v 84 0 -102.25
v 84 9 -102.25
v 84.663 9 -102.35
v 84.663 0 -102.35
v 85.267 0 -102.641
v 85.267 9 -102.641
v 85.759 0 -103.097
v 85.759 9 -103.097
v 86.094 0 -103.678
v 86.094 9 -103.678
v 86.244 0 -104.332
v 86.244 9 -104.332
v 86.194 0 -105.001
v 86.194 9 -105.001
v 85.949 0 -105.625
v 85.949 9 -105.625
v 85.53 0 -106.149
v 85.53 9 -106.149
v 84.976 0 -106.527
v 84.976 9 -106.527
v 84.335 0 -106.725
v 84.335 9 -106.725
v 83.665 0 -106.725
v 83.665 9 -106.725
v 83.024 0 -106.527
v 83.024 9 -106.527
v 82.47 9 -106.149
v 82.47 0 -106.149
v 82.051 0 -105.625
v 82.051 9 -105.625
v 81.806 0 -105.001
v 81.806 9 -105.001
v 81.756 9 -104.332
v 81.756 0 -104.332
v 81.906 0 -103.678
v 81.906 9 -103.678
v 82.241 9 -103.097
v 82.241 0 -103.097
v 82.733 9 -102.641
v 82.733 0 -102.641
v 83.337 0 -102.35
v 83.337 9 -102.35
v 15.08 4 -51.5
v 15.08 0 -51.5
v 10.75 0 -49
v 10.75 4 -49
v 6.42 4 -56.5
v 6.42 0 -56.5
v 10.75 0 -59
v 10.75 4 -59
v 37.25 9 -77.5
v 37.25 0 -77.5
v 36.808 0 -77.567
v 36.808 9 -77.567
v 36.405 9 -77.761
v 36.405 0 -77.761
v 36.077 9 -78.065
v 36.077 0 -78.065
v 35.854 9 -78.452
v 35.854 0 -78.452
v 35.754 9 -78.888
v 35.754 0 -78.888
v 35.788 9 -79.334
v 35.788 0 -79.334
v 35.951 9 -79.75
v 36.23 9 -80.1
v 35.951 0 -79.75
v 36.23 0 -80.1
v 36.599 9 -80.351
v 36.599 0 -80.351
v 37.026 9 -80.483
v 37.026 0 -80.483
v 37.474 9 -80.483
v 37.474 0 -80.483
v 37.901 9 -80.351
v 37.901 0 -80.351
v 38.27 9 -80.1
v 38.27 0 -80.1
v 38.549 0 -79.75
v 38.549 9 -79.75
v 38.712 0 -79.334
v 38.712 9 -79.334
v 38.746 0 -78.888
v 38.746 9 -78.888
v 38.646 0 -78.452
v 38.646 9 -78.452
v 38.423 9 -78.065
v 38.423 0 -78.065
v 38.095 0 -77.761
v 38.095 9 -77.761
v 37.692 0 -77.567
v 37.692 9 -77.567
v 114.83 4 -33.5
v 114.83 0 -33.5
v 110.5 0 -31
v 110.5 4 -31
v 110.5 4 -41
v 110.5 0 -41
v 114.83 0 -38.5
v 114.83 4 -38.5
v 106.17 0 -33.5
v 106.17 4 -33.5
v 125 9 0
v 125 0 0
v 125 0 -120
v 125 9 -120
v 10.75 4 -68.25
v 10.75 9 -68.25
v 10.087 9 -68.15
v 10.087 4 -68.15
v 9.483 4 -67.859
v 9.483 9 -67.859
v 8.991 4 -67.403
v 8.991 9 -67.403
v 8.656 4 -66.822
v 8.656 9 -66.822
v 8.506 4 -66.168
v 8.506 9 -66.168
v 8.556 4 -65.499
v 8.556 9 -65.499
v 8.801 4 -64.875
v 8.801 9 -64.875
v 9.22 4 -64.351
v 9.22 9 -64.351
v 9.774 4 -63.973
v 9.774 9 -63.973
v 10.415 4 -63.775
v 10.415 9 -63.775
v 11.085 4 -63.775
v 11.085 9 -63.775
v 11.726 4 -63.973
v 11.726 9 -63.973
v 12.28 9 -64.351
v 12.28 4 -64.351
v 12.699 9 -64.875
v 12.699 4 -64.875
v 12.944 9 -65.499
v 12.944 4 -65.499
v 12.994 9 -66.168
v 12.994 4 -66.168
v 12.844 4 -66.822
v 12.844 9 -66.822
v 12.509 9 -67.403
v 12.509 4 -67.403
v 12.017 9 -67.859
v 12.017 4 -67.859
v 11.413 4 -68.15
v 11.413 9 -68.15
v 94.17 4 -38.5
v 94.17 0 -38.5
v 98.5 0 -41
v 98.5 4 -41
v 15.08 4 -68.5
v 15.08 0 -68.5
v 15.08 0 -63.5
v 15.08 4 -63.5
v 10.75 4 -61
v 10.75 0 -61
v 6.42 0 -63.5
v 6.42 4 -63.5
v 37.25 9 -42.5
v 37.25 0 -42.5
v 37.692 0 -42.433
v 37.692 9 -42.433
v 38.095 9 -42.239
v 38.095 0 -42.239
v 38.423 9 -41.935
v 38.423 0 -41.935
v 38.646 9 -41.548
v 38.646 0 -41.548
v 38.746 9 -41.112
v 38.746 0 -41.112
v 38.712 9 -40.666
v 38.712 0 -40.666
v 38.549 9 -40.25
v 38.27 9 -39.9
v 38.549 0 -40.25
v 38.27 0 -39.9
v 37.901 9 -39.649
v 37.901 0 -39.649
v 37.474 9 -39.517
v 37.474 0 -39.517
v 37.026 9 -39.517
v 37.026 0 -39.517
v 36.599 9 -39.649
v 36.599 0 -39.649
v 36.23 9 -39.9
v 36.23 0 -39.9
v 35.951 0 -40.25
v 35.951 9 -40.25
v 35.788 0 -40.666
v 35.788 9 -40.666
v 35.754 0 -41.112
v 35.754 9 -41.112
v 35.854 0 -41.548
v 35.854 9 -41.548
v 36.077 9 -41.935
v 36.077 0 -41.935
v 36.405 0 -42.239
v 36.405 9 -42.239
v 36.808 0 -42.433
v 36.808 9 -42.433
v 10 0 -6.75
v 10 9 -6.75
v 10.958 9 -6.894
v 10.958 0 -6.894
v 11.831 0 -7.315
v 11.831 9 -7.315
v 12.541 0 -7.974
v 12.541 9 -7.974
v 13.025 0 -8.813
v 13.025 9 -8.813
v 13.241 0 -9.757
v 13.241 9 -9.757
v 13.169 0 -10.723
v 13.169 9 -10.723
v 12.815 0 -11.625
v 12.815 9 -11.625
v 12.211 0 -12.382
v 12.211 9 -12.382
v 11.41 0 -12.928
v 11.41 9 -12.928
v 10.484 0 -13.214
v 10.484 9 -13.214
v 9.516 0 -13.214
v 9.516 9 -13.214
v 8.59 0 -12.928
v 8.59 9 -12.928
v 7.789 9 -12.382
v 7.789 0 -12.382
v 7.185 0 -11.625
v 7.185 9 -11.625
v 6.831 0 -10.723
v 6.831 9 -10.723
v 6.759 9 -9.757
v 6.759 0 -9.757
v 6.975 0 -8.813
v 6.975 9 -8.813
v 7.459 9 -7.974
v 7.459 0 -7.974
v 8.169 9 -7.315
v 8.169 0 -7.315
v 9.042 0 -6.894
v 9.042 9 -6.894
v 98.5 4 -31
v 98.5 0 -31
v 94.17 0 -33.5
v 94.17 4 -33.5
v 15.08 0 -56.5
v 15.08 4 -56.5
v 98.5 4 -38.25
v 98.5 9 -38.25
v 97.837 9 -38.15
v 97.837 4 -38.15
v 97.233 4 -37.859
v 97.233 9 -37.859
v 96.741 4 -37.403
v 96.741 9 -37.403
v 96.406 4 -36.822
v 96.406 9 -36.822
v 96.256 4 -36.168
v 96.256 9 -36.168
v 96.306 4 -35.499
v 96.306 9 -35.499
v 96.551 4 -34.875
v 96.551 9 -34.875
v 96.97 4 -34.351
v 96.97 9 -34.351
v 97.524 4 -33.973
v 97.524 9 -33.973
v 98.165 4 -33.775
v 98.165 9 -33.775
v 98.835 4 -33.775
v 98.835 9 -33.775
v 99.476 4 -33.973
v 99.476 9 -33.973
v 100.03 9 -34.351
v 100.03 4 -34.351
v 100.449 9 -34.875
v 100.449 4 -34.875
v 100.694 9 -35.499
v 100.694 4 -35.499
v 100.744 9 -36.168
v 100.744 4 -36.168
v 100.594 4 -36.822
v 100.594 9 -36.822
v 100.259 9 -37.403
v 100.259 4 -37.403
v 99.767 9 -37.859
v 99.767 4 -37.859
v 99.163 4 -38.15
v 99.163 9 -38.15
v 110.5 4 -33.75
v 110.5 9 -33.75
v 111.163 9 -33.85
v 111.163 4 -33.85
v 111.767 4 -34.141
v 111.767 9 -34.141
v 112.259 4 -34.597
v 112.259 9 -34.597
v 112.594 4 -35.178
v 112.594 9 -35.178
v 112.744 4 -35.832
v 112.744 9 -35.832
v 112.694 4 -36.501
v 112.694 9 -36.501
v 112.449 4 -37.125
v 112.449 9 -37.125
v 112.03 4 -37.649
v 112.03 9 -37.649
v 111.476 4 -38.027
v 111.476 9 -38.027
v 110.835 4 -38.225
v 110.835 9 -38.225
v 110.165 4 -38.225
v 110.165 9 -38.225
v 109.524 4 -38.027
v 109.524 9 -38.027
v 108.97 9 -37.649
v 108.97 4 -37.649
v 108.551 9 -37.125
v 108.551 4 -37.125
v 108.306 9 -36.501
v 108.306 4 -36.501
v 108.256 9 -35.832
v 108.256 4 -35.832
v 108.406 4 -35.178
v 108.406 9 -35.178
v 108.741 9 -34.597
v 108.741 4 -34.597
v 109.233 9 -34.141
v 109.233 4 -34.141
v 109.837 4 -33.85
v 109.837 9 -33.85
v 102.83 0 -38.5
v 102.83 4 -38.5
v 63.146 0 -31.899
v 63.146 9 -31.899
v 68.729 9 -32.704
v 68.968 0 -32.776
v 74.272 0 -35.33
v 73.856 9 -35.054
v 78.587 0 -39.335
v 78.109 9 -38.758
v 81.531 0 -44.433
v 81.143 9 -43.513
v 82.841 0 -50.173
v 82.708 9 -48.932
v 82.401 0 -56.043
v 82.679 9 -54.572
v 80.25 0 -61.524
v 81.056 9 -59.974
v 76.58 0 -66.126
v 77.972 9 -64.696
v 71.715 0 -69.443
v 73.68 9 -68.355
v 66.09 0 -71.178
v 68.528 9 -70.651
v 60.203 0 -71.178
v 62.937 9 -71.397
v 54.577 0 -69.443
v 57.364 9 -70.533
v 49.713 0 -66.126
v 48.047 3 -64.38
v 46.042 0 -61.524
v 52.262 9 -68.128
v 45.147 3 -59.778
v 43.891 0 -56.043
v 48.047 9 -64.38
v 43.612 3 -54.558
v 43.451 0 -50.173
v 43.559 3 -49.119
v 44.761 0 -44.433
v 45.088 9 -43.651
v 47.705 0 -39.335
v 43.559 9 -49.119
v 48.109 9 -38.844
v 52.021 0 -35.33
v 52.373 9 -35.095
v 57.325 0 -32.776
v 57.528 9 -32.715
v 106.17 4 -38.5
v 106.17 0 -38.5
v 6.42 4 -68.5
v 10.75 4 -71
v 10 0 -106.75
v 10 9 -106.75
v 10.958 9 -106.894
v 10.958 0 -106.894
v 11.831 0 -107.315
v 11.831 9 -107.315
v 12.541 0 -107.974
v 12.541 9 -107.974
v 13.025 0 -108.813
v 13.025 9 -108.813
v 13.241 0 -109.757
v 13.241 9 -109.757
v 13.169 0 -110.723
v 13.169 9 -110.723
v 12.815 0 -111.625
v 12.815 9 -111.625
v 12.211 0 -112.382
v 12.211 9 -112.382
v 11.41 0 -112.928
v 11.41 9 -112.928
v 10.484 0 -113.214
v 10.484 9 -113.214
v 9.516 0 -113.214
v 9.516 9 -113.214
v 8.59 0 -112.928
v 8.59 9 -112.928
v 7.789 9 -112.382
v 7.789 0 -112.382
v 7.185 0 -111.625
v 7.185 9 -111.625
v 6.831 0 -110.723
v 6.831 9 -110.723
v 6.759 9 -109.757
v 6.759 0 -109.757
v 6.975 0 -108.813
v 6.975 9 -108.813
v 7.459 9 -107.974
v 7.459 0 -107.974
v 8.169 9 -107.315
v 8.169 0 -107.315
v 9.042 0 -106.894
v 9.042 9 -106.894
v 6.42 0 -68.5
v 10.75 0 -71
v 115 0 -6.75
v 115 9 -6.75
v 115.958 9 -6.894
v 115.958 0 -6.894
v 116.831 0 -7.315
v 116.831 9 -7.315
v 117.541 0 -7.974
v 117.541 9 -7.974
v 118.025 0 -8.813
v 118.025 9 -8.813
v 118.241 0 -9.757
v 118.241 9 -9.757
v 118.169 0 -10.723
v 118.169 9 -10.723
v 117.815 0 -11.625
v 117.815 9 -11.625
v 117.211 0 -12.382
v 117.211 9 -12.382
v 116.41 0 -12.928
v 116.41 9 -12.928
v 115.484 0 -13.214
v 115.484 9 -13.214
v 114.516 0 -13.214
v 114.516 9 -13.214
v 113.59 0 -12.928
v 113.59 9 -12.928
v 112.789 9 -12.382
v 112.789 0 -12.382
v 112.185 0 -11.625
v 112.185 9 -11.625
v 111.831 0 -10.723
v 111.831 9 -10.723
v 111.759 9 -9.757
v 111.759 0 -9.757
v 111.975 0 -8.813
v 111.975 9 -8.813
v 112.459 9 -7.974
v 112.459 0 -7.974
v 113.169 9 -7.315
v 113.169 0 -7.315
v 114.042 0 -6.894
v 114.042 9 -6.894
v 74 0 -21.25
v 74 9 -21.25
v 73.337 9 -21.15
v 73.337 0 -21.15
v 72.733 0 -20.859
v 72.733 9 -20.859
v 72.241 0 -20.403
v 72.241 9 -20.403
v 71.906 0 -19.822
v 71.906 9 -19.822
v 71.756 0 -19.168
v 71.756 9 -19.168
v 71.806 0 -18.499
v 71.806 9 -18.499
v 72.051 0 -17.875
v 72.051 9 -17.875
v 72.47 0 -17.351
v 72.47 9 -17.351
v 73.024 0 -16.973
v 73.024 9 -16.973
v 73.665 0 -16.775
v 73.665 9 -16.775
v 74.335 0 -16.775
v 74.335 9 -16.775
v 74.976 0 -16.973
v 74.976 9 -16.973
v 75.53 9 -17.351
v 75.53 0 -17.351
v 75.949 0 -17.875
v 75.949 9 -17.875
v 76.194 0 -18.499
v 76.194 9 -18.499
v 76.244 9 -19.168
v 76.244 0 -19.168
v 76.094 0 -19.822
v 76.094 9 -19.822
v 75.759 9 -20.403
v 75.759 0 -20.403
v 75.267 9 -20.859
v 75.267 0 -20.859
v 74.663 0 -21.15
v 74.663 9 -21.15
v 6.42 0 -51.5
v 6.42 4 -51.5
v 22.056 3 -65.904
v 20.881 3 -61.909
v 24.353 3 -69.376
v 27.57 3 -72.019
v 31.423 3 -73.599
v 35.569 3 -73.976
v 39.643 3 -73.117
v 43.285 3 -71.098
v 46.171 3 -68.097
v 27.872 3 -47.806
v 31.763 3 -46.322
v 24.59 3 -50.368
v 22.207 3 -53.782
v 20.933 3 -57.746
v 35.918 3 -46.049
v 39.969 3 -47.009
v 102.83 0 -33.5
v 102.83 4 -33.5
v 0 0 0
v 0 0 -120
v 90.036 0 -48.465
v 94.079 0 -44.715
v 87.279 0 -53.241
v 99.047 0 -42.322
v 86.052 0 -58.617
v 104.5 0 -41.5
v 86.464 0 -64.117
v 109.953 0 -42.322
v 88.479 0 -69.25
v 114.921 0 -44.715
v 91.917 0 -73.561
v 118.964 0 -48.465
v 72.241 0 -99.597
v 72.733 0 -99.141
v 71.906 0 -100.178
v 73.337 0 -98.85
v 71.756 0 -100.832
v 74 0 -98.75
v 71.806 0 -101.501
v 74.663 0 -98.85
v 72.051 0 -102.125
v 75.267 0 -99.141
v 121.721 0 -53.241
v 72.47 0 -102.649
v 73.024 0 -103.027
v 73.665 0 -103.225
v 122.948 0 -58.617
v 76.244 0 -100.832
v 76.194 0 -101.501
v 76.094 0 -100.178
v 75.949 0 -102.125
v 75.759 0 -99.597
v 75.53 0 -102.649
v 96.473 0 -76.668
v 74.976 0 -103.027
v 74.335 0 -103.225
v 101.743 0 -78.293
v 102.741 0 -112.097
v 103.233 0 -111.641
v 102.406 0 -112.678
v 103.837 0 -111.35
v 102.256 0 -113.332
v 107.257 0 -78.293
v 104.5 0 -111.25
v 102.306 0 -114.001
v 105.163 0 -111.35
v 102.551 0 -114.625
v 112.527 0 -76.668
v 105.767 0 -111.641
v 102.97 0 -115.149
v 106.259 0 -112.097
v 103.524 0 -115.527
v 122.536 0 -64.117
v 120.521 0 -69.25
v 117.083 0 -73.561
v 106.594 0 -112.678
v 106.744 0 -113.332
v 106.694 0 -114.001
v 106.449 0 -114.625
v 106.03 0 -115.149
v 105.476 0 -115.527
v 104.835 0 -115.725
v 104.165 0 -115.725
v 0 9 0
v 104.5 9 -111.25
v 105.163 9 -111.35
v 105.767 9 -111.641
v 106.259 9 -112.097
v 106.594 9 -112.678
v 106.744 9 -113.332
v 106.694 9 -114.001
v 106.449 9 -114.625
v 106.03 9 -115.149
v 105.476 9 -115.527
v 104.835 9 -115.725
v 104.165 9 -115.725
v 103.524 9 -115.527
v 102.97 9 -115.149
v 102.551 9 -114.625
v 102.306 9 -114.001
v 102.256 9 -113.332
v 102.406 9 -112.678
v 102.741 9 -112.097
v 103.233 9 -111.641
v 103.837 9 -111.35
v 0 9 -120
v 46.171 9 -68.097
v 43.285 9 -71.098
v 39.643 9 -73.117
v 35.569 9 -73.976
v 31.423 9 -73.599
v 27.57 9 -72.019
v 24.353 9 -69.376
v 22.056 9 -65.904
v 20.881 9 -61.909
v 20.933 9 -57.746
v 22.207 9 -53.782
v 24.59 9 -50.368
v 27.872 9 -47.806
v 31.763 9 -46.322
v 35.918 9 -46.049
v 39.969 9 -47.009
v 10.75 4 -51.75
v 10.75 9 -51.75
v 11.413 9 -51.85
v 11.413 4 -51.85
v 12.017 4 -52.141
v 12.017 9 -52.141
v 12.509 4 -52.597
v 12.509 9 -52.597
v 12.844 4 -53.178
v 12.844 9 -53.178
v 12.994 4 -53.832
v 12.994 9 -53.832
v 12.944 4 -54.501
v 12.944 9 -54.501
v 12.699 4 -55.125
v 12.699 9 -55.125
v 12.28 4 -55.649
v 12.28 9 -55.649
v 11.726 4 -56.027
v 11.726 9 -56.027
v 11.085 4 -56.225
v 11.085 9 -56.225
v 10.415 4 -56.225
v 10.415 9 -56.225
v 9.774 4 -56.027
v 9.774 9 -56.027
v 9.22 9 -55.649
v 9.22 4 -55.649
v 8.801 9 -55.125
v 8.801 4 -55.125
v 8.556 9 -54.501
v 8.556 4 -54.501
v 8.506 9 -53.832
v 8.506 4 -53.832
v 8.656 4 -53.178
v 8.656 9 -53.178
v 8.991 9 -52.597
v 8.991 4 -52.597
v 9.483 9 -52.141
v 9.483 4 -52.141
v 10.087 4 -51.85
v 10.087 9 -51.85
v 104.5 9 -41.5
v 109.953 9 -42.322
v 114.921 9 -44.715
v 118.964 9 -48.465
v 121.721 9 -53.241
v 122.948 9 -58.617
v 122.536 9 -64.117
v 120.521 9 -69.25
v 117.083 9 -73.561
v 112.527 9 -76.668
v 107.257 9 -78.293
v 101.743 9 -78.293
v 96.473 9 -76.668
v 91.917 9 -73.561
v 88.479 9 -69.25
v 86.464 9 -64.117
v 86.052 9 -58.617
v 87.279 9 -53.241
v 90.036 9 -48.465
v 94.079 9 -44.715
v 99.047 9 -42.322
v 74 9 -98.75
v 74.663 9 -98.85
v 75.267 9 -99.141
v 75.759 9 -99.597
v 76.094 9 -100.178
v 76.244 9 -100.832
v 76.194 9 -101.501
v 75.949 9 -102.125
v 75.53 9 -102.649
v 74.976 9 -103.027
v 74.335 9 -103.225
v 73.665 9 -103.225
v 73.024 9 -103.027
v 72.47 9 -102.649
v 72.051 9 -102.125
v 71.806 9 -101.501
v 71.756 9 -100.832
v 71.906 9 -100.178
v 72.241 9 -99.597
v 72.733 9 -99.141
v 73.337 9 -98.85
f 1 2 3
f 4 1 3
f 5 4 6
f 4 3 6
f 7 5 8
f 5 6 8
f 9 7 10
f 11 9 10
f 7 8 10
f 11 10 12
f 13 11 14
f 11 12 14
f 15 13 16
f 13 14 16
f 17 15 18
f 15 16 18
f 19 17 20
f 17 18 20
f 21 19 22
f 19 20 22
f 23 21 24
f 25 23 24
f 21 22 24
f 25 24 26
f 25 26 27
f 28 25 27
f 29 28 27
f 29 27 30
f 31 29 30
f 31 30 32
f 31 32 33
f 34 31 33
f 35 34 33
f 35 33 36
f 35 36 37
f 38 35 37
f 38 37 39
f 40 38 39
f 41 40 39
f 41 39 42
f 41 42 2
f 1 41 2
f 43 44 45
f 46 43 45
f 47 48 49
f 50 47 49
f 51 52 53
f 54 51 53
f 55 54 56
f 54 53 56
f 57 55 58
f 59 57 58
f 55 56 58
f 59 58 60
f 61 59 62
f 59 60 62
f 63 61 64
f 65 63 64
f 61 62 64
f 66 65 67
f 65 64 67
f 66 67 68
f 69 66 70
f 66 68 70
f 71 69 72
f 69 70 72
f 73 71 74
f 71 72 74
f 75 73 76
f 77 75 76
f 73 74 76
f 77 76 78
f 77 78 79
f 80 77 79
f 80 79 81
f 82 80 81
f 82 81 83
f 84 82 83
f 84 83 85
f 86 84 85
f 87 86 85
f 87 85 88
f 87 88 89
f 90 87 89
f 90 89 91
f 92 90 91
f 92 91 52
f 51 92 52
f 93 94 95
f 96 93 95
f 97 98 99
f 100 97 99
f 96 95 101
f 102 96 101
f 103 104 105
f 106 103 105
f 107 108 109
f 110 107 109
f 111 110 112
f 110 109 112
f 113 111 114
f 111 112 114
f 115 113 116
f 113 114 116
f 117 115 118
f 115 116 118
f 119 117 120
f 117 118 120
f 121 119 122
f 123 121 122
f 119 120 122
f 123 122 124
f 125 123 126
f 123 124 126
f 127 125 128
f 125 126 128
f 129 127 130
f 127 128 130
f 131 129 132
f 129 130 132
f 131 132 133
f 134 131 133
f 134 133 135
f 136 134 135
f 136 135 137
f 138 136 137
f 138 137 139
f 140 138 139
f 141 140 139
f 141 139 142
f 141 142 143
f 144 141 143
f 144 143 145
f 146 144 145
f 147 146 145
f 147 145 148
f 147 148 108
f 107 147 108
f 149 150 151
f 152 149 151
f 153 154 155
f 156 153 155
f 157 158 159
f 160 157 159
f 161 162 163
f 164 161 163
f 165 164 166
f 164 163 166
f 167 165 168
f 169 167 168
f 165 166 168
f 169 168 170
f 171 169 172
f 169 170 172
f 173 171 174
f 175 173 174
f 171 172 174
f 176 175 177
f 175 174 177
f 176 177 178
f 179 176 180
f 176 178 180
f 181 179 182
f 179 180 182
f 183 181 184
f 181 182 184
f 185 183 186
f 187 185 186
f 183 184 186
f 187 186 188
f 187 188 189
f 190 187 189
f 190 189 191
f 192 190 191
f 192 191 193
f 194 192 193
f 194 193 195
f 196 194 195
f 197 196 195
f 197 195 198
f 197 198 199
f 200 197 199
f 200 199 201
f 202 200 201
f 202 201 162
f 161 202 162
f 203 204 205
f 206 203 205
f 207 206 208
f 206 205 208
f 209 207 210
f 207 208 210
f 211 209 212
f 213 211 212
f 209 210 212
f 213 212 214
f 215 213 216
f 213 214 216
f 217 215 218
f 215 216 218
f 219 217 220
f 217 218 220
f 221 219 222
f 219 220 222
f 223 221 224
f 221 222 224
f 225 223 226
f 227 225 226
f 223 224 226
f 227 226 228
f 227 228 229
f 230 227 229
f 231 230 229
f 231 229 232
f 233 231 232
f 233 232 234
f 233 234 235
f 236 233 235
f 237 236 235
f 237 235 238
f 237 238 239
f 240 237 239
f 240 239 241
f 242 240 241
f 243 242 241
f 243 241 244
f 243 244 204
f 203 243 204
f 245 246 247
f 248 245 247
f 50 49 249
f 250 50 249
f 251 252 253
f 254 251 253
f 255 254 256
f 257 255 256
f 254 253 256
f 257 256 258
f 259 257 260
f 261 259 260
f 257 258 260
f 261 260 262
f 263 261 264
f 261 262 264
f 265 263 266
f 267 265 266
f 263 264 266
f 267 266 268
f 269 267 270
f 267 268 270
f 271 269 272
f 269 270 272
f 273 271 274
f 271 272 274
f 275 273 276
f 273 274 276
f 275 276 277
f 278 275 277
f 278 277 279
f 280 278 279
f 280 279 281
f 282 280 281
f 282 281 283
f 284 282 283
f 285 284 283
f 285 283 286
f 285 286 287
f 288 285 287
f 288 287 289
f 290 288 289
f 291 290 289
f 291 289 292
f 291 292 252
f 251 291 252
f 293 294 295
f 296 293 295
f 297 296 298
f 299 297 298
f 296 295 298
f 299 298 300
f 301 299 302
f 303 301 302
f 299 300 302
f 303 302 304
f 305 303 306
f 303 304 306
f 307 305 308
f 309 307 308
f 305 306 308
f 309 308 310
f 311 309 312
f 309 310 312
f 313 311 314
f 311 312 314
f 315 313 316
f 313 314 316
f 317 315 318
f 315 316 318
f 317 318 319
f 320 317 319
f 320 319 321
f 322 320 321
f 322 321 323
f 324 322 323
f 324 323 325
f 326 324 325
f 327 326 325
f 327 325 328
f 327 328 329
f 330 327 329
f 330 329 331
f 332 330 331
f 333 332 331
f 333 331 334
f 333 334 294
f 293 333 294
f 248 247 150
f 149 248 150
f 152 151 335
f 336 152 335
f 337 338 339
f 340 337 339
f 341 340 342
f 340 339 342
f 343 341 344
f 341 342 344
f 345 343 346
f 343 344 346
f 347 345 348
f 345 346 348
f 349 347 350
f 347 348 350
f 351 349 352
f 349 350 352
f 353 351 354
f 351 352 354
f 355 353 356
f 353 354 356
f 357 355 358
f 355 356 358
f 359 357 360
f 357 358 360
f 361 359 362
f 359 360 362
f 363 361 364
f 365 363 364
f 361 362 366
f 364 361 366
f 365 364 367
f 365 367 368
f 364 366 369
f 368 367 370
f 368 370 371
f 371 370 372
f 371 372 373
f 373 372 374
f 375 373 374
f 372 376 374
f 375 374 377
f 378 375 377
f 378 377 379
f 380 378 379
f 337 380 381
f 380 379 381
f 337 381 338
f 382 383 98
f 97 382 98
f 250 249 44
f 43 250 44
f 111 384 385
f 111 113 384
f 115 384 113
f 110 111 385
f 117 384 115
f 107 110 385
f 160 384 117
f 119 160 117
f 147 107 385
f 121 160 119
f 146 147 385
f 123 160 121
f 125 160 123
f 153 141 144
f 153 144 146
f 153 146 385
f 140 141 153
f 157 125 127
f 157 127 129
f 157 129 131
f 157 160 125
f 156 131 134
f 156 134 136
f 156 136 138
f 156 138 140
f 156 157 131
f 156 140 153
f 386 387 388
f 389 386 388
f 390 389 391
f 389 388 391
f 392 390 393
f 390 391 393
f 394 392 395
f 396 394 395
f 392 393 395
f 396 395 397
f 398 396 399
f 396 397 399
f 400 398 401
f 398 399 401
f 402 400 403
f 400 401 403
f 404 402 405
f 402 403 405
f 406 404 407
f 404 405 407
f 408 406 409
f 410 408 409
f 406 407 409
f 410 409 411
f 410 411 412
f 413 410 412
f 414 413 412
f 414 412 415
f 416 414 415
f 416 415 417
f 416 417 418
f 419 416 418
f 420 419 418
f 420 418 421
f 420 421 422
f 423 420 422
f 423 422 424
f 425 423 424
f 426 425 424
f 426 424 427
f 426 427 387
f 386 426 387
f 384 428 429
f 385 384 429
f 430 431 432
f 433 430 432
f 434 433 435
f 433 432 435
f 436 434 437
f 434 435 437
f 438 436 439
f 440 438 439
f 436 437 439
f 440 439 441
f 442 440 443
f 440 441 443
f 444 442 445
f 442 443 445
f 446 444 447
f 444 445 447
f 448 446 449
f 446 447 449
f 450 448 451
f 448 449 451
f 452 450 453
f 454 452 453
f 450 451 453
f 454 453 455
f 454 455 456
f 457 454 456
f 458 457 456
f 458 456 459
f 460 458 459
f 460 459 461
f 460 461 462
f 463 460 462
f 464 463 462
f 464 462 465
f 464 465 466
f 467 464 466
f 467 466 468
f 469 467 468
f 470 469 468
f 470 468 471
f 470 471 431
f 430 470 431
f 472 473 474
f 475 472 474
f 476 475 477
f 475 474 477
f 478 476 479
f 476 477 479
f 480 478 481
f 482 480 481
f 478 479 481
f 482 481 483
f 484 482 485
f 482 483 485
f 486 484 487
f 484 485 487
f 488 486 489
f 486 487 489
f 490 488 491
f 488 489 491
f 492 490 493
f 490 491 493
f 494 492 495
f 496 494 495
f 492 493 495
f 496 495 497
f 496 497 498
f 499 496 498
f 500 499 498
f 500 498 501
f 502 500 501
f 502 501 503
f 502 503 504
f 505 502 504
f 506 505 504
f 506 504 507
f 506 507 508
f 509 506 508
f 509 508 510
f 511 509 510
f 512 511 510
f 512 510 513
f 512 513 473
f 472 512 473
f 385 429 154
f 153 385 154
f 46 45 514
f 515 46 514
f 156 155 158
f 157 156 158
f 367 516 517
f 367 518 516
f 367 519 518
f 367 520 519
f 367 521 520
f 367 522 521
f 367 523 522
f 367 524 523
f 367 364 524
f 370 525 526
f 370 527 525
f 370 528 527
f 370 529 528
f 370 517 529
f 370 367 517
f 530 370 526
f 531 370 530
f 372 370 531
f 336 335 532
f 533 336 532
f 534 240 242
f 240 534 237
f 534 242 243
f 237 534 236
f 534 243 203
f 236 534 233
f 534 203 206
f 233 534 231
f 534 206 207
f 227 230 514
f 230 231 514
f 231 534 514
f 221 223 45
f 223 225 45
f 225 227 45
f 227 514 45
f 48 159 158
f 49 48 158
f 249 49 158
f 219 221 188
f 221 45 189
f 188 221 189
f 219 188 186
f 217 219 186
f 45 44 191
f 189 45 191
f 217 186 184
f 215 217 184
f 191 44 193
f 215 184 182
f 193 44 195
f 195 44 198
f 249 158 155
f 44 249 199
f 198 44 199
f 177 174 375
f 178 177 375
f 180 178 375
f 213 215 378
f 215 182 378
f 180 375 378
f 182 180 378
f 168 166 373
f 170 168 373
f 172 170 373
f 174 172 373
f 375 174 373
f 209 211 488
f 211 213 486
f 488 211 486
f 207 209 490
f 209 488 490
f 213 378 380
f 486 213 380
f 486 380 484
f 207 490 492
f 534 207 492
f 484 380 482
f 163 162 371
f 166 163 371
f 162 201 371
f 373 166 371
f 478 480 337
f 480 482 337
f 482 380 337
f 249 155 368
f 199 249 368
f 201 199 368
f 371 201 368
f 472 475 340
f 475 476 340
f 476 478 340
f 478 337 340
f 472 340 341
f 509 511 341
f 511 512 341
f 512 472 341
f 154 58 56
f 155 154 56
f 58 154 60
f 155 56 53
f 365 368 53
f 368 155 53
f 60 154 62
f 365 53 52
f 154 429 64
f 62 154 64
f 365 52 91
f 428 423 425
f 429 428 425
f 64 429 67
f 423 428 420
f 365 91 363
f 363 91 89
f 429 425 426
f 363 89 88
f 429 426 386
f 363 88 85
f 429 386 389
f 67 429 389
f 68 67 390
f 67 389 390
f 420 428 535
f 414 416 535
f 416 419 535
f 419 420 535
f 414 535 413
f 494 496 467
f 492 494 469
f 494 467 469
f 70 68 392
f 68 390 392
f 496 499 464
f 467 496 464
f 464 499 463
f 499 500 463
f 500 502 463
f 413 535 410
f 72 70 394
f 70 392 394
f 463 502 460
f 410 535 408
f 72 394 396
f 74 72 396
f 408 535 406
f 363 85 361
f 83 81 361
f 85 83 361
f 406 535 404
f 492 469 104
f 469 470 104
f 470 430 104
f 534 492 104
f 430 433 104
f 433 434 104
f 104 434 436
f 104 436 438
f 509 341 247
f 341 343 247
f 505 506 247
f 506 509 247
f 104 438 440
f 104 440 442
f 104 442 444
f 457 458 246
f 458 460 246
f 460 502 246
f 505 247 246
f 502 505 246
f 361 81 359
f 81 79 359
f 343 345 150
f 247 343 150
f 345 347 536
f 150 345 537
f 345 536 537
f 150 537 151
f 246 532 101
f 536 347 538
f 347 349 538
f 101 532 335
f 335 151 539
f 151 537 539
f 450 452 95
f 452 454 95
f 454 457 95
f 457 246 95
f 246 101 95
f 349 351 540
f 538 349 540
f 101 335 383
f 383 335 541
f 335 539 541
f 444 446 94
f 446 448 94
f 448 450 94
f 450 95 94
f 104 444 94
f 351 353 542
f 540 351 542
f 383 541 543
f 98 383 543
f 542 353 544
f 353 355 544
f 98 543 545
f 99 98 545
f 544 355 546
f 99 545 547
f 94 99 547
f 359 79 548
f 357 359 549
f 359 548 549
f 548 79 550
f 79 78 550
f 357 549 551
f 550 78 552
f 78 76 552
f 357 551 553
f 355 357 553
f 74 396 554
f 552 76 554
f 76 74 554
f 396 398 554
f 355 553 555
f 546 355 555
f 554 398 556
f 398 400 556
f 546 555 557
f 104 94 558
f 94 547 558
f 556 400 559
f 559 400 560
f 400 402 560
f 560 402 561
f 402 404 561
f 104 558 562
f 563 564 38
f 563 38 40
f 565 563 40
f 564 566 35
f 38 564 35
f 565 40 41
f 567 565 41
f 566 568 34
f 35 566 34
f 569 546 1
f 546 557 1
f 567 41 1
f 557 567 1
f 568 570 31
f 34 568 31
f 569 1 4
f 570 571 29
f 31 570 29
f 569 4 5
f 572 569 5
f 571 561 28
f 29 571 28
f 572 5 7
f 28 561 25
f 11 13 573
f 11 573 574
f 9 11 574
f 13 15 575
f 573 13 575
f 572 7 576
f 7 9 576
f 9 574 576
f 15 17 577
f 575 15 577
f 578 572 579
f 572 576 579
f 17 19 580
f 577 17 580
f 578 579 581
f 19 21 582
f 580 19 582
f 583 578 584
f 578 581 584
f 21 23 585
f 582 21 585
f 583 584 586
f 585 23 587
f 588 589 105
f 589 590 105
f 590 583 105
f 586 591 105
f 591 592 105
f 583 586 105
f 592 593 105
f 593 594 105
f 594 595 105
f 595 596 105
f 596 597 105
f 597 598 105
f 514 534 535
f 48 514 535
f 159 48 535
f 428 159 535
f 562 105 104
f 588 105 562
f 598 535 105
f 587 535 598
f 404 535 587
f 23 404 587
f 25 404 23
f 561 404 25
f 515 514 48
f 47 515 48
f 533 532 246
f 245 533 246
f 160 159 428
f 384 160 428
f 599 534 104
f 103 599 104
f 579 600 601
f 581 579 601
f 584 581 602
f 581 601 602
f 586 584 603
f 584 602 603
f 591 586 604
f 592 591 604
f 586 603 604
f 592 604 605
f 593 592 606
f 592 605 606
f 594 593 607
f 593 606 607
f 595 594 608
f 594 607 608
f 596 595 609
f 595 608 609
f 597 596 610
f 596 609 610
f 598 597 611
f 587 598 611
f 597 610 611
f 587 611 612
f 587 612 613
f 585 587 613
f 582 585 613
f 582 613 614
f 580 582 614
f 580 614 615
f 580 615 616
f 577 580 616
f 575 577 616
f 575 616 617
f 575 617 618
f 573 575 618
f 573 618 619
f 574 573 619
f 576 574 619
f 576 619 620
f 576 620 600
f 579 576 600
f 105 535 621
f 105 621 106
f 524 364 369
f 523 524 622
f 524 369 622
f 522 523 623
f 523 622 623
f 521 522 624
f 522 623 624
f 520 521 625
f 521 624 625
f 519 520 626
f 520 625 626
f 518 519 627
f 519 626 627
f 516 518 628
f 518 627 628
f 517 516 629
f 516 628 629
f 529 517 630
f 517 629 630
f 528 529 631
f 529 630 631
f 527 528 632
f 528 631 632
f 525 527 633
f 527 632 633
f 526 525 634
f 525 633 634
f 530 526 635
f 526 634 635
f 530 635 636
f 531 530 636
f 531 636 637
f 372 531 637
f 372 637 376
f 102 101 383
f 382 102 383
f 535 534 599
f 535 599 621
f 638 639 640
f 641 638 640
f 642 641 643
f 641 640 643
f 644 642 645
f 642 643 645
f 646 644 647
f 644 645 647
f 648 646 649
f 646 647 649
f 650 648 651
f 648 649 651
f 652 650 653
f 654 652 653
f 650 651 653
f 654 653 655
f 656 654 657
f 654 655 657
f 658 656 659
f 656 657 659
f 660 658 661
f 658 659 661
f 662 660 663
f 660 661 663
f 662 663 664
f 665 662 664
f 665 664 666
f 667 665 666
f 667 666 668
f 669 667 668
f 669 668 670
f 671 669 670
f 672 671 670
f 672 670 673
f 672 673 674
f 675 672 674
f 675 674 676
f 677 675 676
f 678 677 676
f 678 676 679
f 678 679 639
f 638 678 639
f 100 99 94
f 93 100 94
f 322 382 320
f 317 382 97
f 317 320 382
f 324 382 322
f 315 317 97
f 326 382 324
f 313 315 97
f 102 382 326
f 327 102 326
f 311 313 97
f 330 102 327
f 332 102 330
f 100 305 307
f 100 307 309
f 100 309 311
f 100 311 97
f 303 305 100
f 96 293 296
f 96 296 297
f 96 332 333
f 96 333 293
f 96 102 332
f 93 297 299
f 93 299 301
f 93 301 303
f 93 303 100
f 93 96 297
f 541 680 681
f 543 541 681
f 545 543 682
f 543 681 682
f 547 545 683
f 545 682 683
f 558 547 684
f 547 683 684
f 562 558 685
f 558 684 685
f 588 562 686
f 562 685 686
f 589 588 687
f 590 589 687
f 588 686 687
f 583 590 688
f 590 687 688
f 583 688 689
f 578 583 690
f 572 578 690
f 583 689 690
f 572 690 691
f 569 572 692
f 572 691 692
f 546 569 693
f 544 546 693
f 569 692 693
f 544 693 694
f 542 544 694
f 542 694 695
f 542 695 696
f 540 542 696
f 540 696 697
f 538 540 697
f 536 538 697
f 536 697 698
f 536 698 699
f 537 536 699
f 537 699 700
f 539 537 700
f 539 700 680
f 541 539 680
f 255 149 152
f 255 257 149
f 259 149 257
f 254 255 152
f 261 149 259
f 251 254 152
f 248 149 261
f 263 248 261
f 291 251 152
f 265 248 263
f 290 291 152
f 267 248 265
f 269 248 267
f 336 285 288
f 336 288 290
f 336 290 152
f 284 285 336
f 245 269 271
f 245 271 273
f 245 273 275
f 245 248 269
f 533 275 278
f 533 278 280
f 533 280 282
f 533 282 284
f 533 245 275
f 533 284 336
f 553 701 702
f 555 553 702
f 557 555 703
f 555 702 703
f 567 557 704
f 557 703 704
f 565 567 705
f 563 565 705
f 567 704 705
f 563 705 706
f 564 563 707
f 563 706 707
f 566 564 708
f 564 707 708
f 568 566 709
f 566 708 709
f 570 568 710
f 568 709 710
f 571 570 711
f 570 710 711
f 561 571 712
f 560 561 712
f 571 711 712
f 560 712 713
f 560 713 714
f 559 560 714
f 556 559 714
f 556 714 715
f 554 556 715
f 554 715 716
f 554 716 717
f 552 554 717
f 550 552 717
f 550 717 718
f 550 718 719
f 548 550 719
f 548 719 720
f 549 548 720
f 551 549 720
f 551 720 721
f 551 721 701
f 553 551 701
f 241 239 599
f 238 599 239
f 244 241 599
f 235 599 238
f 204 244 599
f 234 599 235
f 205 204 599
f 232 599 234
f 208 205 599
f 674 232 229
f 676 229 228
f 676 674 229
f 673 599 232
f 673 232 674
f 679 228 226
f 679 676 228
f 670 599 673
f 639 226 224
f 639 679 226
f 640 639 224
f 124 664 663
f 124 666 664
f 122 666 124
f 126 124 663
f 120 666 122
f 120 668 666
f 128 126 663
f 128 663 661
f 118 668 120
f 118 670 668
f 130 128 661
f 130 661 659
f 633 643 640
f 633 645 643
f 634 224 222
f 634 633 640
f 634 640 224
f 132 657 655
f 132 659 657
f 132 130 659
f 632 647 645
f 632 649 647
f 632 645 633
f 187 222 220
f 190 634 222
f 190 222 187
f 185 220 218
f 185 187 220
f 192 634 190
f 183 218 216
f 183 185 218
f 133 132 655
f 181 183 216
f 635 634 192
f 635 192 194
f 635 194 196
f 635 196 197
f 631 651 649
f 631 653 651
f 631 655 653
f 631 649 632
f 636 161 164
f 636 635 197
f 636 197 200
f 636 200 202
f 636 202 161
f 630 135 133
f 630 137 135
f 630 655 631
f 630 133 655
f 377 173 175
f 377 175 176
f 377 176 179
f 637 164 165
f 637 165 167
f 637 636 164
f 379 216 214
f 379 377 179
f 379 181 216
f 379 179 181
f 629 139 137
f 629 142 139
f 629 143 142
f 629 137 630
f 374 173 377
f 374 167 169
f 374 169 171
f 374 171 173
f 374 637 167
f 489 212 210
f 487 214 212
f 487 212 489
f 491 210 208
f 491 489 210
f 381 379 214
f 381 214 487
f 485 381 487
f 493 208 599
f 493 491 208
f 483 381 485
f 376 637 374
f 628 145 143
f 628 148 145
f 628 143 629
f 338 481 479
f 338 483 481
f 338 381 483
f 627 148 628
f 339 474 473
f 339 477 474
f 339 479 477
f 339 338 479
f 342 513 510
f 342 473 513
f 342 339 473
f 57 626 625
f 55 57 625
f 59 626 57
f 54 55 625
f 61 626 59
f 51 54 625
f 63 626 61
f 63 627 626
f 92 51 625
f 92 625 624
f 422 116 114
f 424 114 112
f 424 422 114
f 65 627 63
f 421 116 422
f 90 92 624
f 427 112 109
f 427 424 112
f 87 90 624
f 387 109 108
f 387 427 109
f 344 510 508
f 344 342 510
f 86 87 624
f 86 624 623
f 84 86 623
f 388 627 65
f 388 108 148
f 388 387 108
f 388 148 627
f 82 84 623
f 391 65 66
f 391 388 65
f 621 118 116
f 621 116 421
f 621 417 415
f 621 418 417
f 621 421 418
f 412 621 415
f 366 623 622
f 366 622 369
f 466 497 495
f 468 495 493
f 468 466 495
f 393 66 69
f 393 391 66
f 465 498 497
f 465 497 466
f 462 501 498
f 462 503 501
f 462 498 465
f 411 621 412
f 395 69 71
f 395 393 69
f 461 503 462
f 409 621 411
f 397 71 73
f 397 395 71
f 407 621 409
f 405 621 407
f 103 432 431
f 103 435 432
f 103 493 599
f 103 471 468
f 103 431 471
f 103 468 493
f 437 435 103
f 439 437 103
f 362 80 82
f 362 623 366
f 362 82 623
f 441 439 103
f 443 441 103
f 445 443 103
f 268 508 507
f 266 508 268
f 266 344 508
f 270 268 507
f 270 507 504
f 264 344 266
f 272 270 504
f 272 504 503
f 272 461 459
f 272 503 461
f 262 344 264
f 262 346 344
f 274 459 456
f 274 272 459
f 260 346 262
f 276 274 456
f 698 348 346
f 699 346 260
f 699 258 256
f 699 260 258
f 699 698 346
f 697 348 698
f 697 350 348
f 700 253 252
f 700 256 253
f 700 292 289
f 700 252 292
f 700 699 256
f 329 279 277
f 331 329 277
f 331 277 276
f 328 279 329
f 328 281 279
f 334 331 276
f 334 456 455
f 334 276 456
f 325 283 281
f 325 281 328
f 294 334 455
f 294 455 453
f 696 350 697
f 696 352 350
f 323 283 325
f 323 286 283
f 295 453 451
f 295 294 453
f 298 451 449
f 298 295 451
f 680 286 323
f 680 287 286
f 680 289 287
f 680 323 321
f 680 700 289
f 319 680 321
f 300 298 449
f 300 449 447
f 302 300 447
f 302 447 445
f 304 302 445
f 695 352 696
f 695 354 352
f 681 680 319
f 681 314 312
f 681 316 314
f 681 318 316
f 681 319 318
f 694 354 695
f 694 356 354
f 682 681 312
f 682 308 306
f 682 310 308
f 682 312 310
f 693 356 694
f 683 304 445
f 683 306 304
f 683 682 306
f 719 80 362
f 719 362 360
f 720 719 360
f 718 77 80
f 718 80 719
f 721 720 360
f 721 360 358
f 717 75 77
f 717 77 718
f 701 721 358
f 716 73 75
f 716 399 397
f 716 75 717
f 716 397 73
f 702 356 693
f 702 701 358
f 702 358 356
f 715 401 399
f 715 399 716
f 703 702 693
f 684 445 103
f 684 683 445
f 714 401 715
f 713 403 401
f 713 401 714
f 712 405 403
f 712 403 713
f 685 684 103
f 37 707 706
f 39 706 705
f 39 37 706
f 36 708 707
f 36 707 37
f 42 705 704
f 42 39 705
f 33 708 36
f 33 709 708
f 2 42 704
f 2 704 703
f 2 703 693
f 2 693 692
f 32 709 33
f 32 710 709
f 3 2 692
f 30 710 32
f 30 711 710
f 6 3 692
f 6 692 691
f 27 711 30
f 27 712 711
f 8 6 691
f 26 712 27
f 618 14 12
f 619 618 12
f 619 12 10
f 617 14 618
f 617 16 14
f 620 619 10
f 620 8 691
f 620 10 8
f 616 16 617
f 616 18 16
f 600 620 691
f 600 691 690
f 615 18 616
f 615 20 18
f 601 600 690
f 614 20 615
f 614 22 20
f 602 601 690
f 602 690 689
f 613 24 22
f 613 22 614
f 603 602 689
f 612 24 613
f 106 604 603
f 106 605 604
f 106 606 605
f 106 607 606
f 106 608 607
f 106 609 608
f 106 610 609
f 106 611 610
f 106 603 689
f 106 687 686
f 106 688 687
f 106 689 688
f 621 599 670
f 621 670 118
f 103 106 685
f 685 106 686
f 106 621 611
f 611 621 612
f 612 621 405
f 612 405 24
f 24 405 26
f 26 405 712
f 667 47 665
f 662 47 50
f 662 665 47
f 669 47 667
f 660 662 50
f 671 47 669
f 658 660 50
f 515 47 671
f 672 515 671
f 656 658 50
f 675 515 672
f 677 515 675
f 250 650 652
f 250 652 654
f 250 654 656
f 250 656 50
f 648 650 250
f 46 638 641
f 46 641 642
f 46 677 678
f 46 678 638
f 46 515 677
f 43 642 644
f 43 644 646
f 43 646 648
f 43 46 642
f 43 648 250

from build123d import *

# Parameters (mm, degrees)
SKETCH1_W                            = 125
SKETCH1_H                            = 120
TOP_BASE_DEPTH                       = 9
SKETCH5_R                            = 14
DRIVE_GEAR_EXTRUDE_CUT_DEPTH         = 6
SKETCH17_R                           = 19.75
INTERMEDIATE_GEAR_TOP_PART_CUT_DEPTH = 174.51080658
SKETCH8_R                            = 18.5
THUMB_EXTRUDE_CUT_DEPTH              = 174.51080658
SKETCH26_R                           = 1.5
STRING_HOLES_DEPTH                   = 174.51080658
THUMB_MOUNT_HOLES_R                  = 2.25
THUMB_MOUNT_HOLES_M4_DEPTH           = 174.51080658
FINGERS_MOUNT_HOLES_R                = 2.25
FINGERS_MOUNT_HOLES_M4_DEPTH         = 174.51080658
CONNECT_HOLES_POSITION_R             = 3.25
CONNECT_HOLES_M6_DEPTH               = 174.51080658
XL320_NUT_M4_DEPTH                   = 4


with BuildPart() as part:
    # Sketch1 → Top_Base (new body)
    with BuildSketch(Plane(origin=(0, 0, 0), x_dir=(1, 0, 0), z_dir=(0, 1, 0))):
        with Locations((62.5, 60)):
            Rectangle(SKETCH1_W, SKETCH1_H)
    extrude(amount=TOP_BASE_DEPTH)

    # Sketch5 → Drive_Gear_Extrude_Cut (cut)
    with BuildSketch(Plane(origin=(0, 9, 0), x_dir=(1, 0, 0), z_dir=(0, 1, 0))):
        with Locations(Location((34.75, 60, 0), (0, 0, 270))):
            Circle(SKETCH5_R)
    extrude(amount=-DRIVE_GEAR_EXTRUDE_CUT_DEPTH, mode=Mode.SUBTRACT)

    # Sketch17 → Intermediate_Gear_Top_Part_Cut (cut, through all)
    with BuildSketch(Plane(origin=(0, 9, 0), x_dir=(1, 0, 0), z_dir=(0, 1, 0))):
        with Locations(Location((63.146123438, 51.648511205, 0), (0, 0, 270))):
            Circle(SKETCH17_R)
    extrude(amount=-INTERMEDIATE_GEAR_TOP_PART_CUT_DEPTH, mode=Mode.SUBTRACT)

    # Sketch8 → Thumb_Extrude_Cut (cut, through all)
    with BuildSketch(Plane(origin=(0, 9, 0), x_dir=(1, 0, 0), z_dir=(0, 1, 0))):
        with Locations(Location((104.5, 60, 0), (0, 0, 270))):
            Circle(SKETCH8_R)
    extrude(amount=-THUMB_EXTRUDE_CUT_DEPTH, mode=Mode.SUBTRACT)

    # Sketch26 → String_Holes (cut, through all)
    with BuildSketch(Plane.XZ):
        with Locations(Location((37.25, -41, 0), (0, 0, 270))):
            Circle(SKETCH26_R)
        with Locations(Location((37.25, -79, 0), (0, 0, 90))):
            Circle(SKETCH26_R)
    extrude(amount=-STRING_HOLES_DEPTH, mode=Mode.SUBTRACT)

    # Thumb_Mount_Holes → Thumb_Mount_Holes_(M4) (cut, through all)
    with BuildSketch(Plane(origin=(0, 9, 0), x_dir=(1, 0, 0), z_dir=(0, 1, 0))):
        with Locations(Location((104.5, 113.5, 0), (0, 0, 270))):
            Circle(THUMB_MOUNT_HOLES_R)
        with Locations(Location((84, 104.5, 0), (0, 0, 270))):
            Circle(THUMB_MOUNT_HOLES_R)
        with Locations(Location((110.5, 36, 0), (0, 0, 270))):
            Circle(THUMB_MOUNT_HOLES_R)
        with Locations(Location((98.5, 36, 0), (0, 0, 90))):
            Circle(THUMB_MOUNT_HOLES_R)
    extrude(amount=-THUMB_MOUNT_HOLES_M4_DEPTH, mode=Mode.SUBTRACT)

    # Fingers_Mount_Holes → Fingers_Mount_Holes_(M4) (cut, through all)
    with BuildSketch(Plane(origin=(0, 9, 0), x_dir=(1, 0, 0), z_dir=(0, 1, 0))):
        with Locations(Location((74, 101, 0), (0, 0, 270))):
            Circle(FINGERS_MOUNT_HOLES_R)
        with Locations(Location((74, 19, 0), (0, 0, 90))):
            Circle(FINGERS_MOUNT_HOLES_R)
        with Locations(Location((10.75, 54, 0), (0, 0, 270))):
            Circle(FINGERS_MOUNT_HOLES_R)
        with Locations(Location((10.75, 66, 0), (0, 0, 90))):
            Circle(FINGERS_MOUNT_HOLES_R)
    extrude(amount=-FINGERS_MOUNT_HOLES_M4_DEPTH, mode=Mode.SUBTRACT)

    # Connect_Holes_Position → Connect_Holes_(M6) (cut, through all)
    with BuildSketch(Plane(origin=(0, 9, 0), x_dir=(1, 0, 0), z_dir=(0, 1, 0))):
        with Locations(Location((10, 110, 0), (0, 0, 270))):
            Circle(CONNECT_HOLES_POSITION_R)
        with Locations(Location((115, 10, 0), (0, 0, 270))):
            Circle(CONNECT_HOLES_POSITION_R)
        with Locations(Location((10, 10, 0), (0, 0, 270))):
            Circle(CONNECT_HOLES_POSITION_R)
    extrude(amount=-CONNECT_HOLES_M6_DEPTH, mode=Mode.SUBTRACT)

    # Sketch27 → XL320_Nut_(M4) (cut)
    with BuildSketch(Plane.XZ):
        Polygon((10.75, -49), (6.419872981, -51.5), (6.419872981, -56.5), (10.75, -59), (15.080127019, -56.5), (15.080127019, -51.5), align=None)
        Polygon((6.419872981, -63.5), (6.419872981, -68.5), (10.75, -71), (15.080127019, -68.5), (15.080127019, -63.5), (10.75, -61), align=None)
        Polygon((102.830127019, -38.5), (102.830127019, -33.5), (98.5, -31), (94.169872981, -33.5), (94.169872981, -38.5), (98.5, -41), align=None)
        Polygon((114.830127019, -33.5), (110.5, -31), (106.169872981, -33.5), (106.169872981, -38.5), (110.5, -41), (114.830127019, -38.5), align=None)
    extrude(amount=-XL320_NUT_M4_DEPTH, mode=Mode.SUBTRACT)


solid = part.part
